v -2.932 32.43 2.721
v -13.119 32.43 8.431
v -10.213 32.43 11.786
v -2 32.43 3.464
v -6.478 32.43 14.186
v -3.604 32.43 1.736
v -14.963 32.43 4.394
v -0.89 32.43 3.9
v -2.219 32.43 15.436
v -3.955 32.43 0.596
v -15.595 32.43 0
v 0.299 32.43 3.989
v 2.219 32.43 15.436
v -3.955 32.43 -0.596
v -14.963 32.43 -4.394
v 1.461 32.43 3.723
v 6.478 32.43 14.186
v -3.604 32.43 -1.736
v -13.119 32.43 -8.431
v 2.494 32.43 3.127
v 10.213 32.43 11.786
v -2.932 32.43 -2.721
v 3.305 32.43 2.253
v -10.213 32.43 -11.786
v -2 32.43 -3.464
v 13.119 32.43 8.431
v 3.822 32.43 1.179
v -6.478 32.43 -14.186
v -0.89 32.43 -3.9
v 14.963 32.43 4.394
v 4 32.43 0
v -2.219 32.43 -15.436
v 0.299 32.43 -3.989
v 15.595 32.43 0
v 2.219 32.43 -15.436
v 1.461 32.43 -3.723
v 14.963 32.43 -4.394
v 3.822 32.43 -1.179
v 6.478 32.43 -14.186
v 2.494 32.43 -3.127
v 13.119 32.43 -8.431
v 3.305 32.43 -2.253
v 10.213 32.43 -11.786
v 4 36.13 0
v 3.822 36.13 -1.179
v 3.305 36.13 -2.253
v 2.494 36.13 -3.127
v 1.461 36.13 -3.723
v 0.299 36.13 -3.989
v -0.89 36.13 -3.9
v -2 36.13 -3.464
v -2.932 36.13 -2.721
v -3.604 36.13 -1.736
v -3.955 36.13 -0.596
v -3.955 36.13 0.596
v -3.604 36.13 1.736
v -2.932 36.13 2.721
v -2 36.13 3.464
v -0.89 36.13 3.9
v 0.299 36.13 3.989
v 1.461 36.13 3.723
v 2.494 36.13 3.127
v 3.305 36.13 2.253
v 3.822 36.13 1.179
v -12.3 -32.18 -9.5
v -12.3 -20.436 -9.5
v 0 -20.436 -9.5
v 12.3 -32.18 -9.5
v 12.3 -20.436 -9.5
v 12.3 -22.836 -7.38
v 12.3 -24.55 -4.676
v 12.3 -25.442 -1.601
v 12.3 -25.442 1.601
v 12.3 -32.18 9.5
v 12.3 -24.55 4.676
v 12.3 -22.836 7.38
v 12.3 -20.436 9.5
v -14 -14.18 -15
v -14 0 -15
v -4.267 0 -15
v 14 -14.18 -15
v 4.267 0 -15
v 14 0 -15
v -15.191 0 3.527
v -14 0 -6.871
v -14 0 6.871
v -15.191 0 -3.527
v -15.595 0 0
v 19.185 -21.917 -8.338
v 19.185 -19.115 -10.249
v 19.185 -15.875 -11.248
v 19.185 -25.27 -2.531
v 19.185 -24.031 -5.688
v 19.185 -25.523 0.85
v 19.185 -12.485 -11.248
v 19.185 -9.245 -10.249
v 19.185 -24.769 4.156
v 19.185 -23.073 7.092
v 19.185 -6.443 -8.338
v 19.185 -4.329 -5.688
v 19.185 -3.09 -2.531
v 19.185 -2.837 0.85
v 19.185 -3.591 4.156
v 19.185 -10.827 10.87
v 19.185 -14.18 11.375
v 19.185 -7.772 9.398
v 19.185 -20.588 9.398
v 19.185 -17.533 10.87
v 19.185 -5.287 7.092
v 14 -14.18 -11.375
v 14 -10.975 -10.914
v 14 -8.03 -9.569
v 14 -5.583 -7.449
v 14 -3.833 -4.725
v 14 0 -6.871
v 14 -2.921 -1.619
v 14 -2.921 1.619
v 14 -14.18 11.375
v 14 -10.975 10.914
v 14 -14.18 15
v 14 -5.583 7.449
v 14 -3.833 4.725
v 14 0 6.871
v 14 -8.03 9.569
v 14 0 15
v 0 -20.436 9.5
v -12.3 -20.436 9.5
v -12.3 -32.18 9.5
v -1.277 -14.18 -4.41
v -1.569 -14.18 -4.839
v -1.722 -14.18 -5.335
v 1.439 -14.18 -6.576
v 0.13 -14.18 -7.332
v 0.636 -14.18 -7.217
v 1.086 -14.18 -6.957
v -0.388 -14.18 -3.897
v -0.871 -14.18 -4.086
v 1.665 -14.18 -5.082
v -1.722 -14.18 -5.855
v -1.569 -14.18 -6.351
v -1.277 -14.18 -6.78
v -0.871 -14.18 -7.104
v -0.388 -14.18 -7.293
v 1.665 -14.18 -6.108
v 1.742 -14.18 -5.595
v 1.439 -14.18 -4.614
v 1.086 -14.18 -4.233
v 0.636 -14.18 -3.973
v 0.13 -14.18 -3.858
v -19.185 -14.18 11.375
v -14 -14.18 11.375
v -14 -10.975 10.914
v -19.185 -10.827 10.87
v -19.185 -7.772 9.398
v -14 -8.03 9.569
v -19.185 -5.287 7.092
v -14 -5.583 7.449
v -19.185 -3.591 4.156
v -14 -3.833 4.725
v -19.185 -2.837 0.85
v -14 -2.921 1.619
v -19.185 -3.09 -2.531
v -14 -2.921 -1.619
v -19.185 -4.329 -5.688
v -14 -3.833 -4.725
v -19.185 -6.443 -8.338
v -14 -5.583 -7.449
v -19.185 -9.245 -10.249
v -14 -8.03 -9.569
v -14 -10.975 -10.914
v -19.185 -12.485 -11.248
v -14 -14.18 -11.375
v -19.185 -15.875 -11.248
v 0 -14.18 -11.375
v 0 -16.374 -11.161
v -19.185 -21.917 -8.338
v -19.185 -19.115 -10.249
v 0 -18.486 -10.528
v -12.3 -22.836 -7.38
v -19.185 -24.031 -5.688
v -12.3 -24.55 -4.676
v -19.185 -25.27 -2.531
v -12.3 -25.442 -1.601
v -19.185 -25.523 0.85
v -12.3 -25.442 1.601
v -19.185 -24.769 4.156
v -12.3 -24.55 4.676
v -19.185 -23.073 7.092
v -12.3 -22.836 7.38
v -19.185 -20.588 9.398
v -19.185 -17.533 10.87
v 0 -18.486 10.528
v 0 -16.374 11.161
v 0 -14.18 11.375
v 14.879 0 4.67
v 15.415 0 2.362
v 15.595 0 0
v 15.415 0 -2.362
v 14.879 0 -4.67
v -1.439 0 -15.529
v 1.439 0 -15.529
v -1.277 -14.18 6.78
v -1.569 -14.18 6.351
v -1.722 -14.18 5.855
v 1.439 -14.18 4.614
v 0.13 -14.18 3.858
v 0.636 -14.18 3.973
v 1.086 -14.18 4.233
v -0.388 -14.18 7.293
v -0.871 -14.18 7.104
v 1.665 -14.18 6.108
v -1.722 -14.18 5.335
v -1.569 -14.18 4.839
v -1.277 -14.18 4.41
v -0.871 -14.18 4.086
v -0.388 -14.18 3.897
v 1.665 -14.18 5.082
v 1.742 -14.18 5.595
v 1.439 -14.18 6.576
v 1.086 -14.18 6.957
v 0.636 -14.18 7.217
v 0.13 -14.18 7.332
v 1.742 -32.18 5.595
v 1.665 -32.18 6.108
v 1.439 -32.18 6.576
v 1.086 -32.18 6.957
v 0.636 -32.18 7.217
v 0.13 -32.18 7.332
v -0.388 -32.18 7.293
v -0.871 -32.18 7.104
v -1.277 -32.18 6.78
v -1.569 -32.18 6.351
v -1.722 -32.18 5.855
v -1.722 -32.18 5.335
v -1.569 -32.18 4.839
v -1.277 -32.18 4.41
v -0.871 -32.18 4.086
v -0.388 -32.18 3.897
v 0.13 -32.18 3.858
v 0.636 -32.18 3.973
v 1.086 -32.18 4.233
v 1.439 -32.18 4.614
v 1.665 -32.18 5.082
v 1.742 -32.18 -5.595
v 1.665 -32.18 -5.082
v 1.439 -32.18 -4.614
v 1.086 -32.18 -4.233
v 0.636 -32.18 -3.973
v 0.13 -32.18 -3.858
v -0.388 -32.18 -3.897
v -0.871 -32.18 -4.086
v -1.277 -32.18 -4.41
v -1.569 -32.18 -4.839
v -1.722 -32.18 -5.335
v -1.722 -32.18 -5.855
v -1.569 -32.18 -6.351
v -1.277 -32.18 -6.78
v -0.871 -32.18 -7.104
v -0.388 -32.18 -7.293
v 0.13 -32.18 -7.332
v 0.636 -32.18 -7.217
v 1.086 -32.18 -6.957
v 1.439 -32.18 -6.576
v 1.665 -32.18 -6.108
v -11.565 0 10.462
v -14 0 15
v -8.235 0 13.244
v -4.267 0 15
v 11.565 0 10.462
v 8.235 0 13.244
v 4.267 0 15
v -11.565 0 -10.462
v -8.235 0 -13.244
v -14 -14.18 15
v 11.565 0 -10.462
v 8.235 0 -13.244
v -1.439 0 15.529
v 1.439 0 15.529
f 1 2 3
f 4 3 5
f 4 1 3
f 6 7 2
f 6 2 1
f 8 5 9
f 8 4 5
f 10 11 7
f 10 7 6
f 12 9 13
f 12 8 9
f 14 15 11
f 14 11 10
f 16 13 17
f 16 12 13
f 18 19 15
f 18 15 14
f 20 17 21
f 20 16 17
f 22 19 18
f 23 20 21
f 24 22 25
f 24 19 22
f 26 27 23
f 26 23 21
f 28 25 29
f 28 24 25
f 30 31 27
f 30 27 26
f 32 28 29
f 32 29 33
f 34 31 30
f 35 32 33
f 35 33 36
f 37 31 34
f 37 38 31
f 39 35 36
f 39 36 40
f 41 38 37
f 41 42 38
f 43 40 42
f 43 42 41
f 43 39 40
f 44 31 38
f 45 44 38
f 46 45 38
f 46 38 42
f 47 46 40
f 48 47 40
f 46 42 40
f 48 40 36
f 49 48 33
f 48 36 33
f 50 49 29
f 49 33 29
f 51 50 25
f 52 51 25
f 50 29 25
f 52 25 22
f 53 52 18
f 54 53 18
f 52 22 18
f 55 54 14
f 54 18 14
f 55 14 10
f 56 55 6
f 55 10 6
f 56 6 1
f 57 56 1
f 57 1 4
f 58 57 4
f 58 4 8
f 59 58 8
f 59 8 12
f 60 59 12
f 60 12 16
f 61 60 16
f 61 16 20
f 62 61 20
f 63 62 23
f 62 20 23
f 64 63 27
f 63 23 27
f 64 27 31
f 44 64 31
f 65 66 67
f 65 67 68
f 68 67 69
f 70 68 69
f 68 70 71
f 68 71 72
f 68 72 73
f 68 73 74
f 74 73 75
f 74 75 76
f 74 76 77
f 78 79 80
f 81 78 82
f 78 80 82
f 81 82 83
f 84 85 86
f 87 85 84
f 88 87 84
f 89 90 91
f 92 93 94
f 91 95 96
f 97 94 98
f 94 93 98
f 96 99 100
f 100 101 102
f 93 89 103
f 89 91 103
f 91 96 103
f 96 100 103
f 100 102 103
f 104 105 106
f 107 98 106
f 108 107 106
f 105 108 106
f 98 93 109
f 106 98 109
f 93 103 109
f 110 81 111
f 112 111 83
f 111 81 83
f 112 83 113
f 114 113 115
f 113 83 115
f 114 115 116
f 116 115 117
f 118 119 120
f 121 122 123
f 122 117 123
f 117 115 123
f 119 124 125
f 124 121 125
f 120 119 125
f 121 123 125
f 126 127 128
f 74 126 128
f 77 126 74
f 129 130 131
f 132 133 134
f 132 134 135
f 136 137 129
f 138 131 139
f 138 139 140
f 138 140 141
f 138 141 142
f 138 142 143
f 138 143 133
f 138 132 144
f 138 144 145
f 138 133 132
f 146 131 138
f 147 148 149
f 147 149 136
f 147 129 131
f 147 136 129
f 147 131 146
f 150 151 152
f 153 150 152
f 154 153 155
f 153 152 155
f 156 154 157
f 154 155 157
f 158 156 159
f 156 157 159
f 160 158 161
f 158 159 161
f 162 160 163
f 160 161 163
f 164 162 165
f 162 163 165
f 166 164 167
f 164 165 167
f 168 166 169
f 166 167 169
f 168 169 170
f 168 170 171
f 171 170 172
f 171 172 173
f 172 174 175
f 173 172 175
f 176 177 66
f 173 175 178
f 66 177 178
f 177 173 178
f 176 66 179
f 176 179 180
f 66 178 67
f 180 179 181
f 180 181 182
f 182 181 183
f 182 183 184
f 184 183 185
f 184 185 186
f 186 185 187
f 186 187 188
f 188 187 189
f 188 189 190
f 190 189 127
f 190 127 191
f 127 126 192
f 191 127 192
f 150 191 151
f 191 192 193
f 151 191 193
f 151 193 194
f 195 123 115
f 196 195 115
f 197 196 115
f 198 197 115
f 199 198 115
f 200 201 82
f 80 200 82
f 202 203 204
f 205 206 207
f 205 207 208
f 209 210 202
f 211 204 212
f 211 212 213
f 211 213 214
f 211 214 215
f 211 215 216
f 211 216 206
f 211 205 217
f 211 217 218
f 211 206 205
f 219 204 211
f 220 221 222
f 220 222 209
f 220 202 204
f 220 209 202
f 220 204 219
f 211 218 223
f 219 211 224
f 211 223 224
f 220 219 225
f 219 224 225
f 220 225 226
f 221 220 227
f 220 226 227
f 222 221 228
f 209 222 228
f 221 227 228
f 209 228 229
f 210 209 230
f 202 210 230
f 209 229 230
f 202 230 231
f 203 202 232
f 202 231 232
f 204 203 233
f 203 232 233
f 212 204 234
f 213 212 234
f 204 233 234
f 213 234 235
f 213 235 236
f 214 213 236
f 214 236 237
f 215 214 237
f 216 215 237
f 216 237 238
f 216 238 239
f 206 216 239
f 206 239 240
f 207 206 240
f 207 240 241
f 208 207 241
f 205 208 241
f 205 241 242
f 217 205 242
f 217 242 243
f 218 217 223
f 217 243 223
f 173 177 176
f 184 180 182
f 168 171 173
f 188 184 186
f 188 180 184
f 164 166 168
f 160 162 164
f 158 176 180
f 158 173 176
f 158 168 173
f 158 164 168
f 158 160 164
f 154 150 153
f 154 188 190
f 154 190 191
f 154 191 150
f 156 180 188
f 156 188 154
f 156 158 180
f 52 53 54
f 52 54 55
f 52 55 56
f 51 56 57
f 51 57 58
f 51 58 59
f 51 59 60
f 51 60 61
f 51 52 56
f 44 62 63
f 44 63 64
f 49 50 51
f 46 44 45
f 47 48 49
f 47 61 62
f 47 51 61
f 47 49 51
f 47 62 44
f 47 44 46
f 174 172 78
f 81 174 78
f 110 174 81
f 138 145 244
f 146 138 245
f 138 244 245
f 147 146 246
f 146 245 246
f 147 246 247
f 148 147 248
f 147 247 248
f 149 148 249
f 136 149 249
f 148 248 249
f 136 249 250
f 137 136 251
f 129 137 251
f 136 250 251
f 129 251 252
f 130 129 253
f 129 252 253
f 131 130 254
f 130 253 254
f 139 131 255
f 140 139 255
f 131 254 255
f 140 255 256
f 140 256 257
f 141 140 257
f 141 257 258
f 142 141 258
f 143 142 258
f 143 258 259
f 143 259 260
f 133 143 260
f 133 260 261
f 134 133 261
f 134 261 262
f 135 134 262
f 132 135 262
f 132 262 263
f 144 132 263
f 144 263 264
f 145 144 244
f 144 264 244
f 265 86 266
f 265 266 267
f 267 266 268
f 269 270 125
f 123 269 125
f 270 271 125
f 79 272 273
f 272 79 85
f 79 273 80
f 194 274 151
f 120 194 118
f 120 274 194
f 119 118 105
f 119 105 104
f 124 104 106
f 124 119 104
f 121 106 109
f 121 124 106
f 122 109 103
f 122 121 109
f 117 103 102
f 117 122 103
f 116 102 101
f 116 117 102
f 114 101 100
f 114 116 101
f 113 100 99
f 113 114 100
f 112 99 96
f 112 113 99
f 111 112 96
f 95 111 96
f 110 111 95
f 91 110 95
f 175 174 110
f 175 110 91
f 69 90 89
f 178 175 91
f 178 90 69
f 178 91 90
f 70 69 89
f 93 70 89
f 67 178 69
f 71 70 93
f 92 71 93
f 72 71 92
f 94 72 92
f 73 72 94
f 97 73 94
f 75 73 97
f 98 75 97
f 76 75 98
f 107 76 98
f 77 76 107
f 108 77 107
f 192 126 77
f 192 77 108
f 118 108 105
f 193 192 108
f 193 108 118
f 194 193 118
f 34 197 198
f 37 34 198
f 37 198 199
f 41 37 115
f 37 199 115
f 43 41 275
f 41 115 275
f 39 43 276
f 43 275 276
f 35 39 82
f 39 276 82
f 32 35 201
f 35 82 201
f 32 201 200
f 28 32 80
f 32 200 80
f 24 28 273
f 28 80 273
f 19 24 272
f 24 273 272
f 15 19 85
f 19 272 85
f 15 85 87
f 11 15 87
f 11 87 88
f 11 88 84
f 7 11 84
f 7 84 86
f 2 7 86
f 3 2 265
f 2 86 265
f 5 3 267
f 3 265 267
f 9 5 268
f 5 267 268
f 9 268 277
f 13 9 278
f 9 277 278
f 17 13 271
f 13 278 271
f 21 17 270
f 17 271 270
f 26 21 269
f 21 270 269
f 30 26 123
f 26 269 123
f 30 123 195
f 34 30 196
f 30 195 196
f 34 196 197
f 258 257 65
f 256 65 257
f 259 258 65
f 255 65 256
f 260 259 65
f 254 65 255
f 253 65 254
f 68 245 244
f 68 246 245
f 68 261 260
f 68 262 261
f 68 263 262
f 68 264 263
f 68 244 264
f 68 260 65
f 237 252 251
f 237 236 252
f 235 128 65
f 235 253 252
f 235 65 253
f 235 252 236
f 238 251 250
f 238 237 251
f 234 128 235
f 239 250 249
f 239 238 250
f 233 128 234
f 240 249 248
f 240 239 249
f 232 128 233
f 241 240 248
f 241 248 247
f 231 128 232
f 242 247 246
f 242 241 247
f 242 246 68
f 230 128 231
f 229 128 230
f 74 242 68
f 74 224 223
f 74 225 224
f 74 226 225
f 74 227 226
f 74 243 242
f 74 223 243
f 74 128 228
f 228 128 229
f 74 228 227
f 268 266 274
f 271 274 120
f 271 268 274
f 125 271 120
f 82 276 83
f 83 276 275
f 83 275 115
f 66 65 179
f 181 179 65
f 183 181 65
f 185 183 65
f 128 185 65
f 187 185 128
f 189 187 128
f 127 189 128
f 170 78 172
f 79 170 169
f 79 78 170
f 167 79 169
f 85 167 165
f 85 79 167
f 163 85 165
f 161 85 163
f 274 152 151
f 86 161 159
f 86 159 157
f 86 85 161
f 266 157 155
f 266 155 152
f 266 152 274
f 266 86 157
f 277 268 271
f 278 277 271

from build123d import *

# Parameters (mm, degrees)
SKETCH1_R                = 15.595
BOSS_EXTRUDE1_DEPTH      = 32.43
SKETCH2_R                = 4
BOSS_EXTRUDE2_DEPTH      = 3.7
SKETCH3_W                = 28
SKETCH3_H                = 30
BOSS_EXTRUDE3_DEPTH      = 14.18
SKETCH5_R                = 11.375
BOSS_EXTRUDE4_DEPTH      = 19.185
BOSS_EXTRUDE4_DEPTH_BACK = 19.185
SKETCH7_W                = 24.6
SKETCH7_H                = 19
BOSS_EXTRUDE5_DEPTH      = 18
SKETCH8_R                = 1.74191559
CUT_EXTRUDE1_DEPTH       = 18


with BuildPart() as part:
    # Sketch1 → Boss-Extrude1 (new body)
    with BuildSketch(Plane(origin=(0, 0, 0), x_dir=(1, 0, 0), z_dir=(0, 1, 0))):
        Circle(SKETCH1_R)
    extrude(amount=BOSS_EXTRUDE1_DEPTH)

    # Sketch2 → Boss-Extrude2 (add)
    with BuildSketch(Plane(origin=(0, 32.43, 0), x_dir=(1, 0, 0), z_dir=(0, 1, 0))):
        Circle(SKETCH2_R)
    extrude(amount=BOSS_EXTRUDE2_DEPTH)

    # Sketch3 → Boss-Extrude3 (add)
    with BuildSketch(Plane.XZ):
        Rectangle(SKETCH3_W, SKETCH3_H)
    extrude(amount=BOSS_EXTRUDE3_DEPTH)

    # Sketch5 → Boss-Extrude4 (add, two sides)
    with BuildSketch(Plane.ZY) as boss_extrude4_sk:
        with Locations((0, -14.18)):
            Circle(SKETCH5_R)
    extrude(amount=BOSS_EXTRUDE4_DEPTH)
    extrude(boss_extrude4_sk.sketch, amount=-BOSS_EXTRUDE4_DEPTH_BACK)

    # Sketch7 → Boss-Extrude5 (add)
    with BuildSketch(Plane.XZ.offset(14.18)):
        Rectangle(SKETCH7_W, SKETCH7_H)
    extrude(amount=BOSS_EXTRUDE5_DEPTH)

    # Sketch8 → Cut-Extrude1 (cut)
    with BuildSketch(Plane.XZ.offset(32.18)):
        with Locations((0, 5.595)):
            Circle(SKETCH8_R)
        with Locations((0, -5.595)):
            Circle(SKETCH8_R)
    extrude(amount=-CUT_EXTRUDE1_DEPTH, mode=Mode.SUBTRACT)


solid = part.part
